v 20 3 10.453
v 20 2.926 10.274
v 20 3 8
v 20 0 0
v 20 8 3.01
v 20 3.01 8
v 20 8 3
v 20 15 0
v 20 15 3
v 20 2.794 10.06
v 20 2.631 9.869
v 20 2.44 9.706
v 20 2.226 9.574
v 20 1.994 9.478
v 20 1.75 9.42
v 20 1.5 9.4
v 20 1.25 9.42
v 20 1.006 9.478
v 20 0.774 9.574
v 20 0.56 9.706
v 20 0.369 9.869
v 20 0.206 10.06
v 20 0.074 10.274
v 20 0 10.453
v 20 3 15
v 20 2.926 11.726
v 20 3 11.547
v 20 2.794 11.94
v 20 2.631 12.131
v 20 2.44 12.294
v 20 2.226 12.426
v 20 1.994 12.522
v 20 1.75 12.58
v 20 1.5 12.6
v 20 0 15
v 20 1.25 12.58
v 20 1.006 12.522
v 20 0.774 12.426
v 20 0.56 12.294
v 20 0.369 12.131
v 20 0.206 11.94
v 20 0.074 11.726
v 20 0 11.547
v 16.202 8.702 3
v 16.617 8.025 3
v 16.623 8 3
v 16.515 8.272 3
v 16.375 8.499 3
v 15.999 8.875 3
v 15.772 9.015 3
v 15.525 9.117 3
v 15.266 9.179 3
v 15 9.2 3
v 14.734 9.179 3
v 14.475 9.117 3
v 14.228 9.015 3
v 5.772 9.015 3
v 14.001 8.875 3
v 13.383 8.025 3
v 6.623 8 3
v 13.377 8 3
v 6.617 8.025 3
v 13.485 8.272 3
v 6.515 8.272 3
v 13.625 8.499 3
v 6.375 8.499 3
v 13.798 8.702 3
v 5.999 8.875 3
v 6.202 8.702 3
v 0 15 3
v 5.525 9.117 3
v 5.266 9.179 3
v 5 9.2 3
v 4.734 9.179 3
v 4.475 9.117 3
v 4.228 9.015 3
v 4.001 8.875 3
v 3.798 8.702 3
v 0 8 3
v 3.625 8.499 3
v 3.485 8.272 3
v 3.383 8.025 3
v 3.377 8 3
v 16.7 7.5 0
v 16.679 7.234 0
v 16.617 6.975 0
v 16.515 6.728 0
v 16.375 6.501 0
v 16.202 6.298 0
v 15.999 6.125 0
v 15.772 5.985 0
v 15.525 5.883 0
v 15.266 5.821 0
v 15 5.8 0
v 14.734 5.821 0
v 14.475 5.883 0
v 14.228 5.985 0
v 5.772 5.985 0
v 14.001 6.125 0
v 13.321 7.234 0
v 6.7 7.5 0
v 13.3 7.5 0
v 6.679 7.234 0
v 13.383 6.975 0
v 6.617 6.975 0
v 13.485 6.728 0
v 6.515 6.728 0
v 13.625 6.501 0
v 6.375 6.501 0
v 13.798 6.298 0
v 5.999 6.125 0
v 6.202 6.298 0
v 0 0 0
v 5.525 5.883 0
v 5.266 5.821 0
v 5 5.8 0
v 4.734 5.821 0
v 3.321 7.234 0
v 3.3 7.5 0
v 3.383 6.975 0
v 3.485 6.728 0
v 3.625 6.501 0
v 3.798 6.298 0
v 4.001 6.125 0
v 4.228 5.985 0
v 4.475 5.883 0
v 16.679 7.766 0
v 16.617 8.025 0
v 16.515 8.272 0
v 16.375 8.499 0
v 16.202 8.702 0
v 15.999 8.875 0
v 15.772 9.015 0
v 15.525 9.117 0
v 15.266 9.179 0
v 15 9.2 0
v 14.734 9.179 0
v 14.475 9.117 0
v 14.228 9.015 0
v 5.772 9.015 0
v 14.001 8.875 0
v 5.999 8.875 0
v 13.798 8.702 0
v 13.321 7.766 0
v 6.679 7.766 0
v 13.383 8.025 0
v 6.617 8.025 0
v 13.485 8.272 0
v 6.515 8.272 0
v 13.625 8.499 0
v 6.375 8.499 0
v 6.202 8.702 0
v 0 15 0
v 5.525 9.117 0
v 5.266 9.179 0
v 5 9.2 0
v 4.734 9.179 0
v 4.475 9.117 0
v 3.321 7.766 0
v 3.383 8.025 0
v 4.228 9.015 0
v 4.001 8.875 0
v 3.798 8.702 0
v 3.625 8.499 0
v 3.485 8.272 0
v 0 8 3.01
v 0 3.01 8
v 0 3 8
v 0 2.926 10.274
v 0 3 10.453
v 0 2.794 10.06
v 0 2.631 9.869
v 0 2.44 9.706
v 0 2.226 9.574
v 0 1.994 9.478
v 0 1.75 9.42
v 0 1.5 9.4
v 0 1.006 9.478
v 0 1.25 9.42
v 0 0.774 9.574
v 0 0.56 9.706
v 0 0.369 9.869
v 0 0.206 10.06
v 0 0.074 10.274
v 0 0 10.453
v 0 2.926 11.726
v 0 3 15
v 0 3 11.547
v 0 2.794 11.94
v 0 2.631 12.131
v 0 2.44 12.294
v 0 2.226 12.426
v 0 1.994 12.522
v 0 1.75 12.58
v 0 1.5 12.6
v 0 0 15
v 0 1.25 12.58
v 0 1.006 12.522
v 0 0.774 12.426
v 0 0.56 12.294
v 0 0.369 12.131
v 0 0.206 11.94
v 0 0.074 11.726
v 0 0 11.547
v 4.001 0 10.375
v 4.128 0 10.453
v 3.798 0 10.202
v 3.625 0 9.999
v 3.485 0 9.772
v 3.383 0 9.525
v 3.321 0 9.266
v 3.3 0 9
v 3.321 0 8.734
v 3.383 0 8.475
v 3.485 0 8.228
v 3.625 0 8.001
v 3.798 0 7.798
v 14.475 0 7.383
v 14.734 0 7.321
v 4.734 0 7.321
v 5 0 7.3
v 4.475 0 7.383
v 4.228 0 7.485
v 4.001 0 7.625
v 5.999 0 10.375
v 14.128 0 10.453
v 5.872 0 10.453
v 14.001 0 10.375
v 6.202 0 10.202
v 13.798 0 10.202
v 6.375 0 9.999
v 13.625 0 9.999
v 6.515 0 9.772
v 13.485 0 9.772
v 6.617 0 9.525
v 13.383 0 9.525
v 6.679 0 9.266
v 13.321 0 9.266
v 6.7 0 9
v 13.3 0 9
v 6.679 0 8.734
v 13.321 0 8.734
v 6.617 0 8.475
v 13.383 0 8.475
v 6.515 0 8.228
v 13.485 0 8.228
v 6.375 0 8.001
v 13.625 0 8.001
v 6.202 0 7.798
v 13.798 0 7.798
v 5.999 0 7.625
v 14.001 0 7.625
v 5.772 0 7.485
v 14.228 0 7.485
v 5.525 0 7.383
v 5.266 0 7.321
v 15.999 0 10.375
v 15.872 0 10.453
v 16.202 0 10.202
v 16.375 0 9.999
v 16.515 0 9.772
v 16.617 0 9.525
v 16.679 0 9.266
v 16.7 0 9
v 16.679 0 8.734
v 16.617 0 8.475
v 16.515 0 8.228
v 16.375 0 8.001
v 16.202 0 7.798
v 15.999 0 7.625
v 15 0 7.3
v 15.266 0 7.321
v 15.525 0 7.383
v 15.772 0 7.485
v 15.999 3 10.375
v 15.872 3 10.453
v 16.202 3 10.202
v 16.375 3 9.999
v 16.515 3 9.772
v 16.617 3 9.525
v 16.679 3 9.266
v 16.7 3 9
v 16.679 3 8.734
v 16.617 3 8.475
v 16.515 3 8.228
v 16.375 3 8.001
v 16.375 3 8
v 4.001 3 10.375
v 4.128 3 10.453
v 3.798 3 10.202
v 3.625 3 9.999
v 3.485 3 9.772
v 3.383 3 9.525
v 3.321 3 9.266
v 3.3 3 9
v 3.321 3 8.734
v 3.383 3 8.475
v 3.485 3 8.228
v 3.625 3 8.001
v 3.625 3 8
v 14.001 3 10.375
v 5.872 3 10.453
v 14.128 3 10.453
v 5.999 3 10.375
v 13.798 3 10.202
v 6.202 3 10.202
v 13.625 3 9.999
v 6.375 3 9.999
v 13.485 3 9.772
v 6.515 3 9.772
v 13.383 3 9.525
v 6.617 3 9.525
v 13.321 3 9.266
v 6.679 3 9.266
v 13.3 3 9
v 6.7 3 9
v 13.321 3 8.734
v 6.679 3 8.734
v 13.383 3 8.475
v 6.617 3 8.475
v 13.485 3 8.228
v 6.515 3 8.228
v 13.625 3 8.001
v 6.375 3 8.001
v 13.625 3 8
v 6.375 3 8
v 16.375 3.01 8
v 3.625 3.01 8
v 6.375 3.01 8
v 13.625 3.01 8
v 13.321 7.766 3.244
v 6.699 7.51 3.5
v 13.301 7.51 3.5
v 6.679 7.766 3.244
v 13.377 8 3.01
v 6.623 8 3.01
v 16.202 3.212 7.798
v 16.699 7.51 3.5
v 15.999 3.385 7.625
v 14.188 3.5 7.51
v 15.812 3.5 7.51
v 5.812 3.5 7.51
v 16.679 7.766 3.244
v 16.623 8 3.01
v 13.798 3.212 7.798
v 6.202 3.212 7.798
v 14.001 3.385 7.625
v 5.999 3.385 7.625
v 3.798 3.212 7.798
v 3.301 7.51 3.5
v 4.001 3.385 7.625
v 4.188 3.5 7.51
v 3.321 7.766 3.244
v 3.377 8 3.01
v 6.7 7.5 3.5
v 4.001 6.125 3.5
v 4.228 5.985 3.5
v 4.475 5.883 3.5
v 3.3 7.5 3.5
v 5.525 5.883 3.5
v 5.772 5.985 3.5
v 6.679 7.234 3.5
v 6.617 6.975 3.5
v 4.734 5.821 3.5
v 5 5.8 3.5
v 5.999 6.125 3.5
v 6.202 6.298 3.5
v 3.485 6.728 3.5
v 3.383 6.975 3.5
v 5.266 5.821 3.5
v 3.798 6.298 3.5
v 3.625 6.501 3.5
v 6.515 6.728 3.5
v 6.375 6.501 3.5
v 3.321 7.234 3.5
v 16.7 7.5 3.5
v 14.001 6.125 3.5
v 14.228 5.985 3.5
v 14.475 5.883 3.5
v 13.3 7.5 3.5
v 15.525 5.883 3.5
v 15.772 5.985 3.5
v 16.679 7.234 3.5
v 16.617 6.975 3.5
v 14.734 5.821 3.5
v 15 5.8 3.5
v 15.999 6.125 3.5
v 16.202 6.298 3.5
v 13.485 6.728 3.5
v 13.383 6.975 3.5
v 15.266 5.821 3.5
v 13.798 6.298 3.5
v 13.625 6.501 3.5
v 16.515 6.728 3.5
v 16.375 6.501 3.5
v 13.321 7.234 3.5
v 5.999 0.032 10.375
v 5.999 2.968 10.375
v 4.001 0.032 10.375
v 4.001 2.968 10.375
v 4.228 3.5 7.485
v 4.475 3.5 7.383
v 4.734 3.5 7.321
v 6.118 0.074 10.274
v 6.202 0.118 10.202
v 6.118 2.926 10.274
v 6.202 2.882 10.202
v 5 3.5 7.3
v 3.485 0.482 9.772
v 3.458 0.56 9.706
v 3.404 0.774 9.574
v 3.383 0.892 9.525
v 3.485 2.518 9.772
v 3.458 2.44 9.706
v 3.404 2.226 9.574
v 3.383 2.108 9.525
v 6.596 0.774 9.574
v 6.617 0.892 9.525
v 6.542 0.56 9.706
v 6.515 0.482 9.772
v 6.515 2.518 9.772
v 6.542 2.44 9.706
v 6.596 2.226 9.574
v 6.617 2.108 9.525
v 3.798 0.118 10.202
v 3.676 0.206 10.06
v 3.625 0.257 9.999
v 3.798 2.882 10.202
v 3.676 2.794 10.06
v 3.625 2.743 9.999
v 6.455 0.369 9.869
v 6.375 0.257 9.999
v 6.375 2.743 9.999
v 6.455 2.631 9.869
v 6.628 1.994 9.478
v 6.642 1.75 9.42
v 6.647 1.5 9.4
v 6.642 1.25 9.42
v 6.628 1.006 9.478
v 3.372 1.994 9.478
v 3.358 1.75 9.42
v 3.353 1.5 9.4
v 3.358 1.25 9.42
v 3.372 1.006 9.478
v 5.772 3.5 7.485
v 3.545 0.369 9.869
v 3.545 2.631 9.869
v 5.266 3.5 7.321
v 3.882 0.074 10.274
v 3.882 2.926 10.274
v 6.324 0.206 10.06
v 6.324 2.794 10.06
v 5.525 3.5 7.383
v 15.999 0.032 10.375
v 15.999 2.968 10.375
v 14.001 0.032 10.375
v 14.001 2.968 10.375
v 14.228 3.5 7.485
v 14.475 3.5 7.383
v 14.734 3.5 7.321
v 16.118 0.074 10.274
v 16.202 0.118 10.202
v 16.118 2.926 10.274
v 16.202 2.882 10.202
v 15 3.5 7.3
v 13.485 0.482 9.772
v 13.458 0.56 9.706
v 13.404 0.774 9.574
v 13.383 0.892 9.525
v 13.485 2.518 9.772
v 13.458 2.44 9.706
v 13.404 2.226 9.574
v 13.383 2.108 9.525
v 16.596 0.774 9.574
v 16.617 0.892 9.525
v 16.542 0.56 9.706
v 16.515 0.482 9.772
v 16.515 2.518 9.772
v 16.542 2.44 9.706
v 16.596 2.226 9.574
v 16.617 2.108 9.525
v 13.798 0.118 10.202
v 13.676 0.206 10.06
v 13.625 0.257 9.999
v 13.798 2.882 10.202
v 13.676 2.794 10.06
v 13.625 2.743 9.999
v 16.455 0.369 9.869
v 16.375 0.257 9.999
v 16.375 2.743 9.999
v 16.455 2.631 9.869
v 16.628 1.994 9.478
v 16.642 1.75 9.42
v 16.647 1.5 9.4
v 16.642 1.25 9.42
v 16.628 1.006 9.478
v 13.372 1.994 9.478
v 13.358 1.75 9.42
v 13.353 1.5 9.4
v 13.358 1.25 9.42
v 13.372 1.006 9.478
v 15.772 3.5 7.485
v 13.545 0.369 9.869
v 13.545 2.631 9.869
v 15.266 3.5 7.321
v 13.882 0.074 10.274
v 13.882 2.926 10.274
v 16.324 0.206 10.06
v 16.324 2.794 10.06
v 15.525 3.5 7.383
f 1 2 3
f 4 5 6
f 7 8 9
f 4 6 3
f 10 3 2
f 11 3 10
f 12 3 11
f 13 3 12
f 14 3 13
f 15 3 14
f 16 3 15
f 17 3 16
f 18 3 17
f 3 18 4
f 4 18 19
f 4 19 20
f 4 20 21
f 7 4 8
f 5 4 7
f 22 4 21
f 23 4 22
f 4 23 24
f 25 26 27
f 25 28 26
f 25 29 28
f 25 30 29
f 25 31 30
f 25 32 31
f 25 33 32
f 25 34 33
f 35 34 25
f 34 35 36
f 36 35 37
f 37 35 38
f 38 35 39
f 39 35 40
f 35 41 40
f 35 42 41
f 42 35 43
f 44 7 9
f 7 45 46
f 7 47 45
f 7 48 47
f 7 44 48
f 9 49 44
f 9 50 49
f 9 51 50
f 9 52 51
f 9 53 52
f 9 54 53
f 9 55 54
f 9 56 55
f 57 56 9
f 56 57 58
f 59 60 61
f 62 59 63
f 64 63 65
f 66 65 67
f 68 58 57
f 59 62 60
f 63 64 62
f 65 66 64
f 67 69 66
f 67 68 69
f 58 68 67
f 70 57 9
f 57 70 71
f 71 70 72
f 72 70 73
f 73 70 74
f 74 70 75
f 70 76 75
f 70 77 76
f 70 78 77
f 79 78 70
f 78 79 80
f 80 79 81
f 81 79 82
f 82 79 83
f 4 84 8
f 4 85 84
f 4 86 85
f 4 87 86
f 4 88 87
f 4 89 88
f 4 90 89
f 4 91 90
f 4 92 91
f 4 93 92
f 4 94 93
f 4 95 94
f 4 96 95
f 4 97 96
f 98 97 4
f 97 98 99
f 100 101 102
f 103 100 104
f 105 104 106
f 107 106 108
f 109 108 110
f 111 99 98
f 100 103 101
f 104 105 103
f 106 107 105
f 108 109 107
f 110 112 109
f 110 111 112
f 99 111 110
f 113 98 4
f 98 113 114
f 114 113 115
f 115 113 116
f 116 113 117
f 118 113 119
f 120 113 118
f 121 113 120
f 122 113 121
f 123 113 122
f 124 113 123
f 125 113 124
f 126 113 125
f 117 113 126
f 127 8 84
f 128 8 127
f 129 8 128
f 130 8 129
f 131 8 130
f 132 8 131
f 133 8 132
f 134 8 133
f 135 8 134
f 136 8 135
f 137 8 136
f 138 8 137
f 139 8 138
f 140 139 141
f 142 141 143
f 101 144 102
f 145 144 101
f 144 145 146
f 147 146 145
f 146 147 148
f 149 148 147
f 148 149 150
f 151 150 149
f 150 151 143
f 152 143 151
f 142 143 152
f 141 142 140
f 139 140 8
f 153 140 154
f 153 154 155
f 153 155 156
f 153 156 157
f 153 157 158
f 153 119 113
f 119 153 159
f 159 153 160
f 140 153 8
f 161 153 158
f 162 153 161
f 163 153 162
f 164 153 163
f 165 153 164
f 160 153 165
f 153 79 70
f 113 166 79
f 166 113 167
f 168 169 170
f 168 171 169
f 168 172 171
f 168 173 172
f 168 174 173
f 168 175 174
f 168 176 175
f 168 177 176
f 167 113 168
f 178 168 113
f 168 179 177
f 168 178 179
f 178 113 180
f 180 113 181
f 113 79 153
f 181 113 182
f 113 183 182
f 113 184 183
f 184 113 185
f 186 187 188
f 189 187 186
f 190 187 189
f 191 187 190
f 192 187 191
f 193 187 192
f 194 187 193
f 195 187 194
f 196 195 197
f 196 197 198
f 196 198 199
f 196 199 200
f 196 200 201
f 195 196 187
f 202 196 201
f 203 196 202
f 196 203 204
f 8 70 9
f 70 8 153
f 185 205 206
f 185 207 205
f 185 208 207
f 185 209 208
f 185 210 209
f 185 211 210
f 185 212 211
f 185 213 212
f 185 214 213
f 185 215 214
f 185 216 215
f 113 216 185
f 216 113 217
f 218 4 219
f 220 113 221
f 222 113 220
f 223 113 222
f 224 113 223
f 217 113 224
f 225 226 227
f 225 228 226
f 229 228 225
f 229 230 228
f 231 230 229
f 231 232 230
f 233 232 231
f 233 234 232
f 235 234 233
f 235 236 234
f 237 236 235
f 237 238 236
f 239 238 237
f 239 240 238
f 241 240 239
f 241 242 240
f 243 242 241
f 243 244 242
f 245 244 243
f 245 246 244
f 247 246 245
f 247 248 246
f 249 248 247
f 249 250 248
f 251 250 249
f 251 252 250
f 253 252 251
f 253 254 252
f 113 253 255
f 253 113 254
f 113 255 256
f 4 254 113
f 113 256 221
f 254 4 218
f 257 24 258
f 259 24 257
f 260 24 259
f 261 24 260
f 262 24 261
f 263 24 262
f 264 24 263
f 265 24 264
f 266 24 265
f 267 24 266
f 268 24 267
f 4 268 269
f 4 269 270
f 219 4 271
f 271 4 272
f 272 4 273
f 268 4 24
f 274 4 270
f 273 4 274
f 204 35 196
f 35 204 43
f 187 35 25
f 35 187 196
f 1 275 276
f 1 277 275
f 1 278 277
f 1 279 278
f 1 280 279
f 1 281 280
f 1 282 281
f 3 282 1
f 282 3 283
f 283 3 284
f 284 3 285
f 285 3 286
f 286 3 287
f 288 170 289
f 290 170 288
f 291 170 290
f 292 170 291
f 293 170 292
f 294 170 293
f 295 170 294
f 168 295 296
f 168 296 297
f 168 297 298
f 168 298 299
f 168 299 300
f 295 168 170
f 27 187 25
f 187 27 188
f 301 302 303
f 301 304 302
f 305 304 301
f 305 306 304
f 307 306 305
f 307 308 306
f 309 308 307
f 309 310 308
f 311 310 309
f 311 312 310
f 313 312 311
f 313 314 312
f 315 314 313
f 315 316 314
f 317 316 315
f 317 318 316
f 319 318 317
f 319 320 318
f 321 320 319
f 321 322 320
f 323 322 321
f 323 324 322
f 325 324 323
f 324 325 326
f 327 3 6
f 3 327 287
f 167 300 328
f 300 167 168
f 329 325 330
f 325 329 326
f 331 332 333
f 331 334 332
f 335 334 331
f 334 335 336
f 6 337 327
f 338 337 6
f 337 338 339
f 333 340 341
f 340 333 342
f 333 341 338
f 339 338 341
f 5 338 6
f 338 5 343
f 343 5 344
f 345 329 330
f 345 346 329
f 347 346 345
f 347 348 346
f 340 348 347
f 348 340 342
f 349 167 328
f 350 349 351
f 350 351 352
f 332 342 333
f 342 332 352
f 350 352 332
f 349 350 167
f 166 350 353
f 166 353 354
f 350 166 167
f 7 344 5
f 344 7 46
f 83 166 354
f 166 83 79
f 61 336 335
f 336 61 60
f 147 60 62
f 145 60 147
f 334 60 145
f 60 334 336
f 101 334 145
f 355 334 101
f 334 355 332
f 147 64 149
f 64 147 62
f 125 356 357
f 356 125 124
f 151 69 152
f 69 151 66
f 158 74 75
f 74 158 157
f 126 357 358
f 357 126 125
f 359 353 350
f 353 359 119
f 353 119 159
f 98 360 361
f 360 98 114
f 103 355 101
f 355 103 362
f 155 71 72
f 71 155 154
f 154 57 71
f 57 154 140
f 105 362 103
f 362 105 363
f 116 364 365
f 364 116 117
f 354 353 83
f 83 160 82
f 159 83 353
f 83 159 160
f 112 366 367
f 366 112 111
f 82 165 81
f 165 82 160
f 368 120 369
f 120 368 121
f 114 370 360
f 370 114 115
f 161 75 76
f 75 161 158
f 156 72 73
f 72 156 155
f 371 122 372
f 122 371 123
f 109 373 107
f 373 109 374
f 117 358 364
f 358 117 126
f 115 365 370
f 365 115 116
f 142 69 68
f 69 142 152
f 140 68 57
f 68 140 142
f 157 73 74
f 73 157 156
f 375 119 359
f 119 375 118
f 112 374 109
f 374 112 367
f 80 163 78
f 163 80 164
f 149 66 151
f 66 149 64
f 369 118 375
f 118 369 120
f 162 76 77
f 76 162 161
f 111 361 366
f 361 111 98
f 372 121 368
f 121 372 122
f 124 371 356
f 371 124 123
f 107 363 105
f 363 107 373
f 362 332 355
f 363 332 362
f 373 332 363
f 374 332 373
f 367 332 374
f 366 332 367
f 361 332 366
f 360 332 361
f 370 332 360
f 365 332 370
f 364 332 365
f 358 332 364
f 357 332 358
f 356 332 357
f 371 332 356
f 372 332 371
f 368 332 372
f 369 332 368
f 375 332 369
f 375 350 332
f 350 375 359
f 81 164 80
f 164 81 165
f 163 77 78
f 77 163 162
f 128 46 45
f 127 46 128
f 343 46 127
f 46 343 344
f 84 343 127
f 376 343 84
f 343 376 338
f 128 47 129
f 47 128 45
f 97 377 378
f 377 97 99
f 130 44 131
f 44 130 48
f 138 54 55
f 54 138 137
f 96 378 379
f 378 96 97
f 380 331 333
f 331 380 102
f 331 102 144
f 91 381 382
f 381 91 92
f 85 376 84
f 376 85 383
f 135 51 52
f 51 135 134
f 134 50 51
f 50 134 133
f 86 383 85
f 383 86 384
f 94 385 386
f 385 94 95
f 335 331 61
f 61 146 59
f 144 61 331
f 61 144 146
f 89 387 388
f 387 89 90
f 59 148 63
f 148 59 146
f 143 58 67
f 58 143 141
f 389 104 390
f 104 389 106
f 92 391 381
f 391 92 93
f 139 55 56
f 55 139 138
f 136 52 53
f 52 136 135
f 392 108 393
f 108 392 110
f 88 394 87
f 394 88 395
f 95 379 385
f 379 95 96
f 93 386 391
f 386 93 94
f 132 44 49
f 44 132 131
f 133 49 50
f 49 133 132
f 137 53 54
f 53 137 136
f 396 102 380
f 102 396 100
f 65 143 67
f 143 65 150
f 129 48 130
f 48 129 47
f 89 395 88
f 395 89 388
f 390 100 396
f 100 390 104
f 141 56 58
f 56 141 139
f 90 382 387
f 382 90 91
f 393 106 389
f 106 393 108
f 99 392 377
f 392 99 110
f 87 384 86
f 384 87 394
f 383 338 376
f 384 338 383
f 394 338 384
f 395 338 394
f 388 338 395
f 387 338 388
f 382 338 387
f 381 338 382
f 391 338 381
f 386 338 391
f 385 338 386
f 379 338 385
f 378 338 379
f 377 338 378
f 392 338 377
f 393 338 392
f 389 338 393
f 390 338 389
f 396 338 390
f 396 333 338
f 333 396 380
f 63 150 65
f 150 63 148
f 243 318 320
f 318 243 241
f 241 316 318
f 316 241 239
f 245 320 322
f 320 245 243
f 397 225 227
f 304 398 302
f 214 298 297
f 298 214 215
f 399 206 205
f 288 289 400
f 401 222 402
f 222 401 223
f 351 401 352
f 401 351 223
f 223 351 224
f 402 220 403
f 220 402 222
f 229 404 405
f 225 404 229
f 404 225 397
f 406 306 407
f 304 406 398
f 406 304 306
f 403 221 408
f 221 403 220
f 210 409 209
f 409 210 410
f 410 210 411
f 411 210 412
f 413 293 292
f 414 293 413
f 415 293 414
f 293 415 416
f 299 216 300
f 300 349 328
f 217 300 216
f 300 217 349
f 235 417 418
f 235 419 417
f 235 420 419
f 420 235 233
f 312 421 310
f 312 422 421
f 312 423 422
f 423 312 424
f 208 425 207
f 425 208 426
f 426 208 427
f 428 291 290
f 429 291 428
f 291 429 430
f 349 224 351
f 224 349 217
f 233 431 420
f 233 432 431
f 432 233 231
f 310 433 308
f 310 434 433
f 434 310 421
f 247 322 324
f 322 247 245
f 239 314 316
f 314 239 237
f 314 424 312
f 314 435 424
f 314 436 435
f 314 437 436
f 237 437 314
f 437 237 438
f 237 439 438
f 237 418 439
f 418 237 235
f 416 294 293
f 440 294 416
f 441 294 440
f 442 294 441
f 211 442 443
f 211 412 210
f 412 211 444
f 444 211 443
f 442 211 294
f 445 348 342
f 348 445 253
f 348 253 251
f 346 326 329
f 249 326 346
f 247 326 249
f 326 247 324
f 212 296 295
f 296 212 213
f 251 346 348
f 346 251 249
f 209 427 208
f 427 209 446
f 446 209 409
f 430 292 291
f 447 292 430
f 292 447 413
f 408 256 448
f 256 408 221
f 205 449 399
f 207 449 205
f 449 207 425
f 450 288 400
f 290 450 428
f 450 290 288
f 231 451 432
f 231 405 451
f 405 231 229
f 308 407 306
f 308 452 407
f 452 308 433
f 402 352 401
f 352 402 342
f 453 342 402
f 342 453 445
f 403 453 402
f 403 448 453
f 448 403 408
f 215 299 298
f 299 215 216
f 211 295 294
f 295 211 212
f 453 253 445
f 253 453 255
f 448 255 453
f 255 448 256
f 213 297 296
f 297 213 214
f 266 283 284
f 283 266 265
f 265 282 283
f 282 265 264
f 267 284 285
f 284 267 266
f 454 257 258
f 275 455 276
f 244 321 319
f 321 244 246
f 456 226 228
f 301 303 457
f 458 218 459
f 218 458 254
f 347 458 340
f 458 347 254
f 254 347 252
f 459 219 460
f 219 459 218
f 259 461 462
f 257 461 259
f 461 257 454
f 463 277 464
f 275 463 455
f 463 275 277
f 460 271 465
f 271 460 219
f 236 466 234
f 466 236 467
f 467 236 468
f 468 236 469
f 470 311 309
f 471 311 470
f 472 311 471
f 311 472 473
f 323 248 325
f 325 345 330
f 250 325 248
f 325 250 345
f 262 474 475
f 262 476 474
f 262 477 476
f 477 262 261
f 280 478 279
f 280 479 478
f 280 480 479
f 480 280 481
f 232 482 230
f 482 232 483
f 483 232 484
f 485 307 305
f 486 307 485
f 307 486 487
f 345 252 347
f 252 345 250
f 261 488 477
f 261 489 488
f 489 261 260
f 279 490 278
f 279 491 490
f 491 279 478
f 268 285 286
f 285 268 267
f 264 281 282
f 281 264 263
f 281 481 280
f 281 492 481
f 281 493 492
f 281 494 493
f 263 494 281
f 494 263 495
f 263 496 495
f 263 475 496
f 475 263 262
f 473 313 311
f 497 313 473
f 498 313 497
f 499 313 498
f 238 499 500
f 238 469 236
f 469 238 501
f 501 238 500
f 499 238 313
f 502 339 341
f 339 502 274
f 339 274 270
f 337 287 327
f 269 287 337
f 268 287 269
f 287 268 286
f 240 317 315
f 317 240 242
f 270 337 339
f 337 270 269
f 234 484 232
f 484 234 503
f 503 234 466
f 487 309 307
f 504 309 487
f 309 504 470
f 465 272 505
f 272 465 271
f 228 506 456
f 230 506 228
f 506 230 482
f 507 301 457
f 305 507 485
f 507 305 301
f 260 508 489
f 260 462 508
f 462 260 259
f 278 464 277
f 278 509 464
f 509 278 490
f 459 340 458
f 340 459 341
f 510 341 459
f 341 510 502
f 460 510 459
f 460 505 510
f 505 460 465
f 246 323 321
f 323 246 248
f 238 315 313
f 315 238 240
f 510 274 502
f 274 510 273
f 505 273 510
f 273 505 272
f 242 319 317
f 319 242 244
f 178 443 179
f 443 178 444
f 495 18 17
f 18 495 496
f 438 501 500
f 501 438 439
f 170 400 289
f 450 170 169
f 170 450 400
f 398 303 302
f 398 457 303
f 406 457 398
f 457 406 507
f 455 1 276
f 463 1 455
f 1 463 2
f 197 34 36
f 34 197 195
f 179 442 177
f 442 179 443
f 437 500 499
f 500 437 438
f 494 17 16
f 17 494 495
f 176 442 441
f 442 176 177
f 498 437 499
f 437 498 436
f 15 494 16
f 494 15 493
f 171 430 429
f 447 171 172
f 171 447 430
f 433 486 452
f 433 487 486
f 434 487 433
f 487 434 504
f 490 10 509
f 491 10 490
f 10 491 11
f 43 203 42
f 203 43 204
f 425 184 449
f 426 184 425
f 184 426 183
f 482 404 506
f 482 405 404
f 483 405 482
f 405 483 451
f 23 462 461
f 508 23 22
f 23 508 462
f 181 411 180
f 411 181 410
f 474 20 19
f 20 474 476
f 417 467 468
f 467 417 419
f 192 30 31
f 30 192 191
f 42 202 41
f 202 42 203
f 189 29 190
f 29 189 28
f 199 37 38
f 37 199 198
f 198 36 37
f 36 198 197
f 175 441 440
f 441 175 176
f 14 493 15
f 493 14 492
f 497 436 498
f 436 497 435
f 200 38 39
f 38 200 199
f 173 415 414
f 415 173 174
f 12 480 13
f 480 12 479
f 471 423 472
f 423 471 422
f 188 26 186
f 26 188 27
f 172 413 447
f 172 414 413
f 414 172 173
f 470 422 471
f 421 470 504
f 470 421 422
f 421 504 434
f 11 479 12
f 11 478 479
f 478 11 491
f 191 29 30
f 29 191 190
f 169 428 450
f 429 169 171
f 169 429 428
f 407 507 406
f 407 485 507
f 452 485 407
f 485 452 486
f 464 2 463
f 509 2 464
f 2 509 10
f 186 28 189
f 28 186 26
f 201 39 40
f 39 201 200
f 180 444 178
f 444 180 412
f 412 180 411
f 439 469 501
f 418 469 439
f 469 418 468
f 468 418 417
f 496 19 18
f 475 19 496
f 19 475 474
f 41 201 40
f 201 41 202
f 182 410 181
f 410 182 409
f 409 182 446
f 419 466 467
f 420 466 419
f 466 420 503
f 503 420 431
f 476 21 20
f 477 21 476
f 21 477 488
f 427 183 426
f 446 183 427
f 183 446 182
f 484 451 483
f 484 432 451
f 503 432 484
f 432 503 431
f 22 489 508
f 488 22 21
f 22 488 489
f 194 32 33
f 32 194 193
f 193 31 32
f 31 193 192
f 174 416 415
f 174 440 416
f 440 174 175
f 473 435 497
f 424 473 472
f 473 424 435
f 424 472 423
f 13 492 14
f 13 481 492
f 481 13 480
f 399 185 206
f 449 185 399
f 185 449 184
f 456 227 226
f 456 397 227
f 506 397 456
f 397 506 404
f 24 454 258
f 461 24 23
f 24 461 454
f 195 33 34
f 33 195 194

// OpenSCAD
// FoldIt Robot - L-Shaped Hinge Bracket
// Connects folding panels to the base plate via hinge pins
// Dimensions: 20mm x 15mm x 15mm, 3mm wall thickness
// Two M3 holes on each arm, 3mm hinge pin hole

$fn = 40;

// Bracket parameters
bracket_width = 20;      // width (along hinge axis)
bracket_arm_h = 15;      // height of vertical arm
bracket_arm_l = 15;      // length of horizontal arm
wall = 3;                // wall thickness

// Hole parameters
m3_hole = 3.4;           // M3 clearance
pin_hole = 3.2;          // hinge pin diameter (3mm pin + clearance)
hole_inset = 5;          // inset from edges for mounting holes

module hinge_bracket() {
    difference() {
        // L-shaped body
        union() {
            // Horizontal arm (mounts to base plate)
            cube([bracket_width, bracket_arm_l, wall]);

            // Vertical arm (mounts to panel and holds hinge pin)
            cube([bracket_width, wall, bracket_arm_h]);

            // Fillet/reinforcement at the L junction
            translate([0, 0, 0])
                _corner_fillet();
        }

        // Horizontal arm mounting holes (2 holes for M3 screws into base)
        for (x = [hole_inset, bracket_width - hole_inset]) {
            translate([x, bracket_arm_l / 2, -0.5])
                cylinder(d=m3_hole, h=wall + 1);
        }

        // Vertical arm mounting holes (2 holes for M3 screws into panel)
        for (x = [hole_inset, bracket_width - hole_inset]) {
            translate([x, -0.5, bracket_arm_h * 0.6])
                rotate([-90, 0, 0])
                    cylinder(d=m3_hole, h=wall + 1);
        }

        // Hinge pin hole through the top of the vertical arm
        translate([-0.5, wall / 2, bracket_arm_h - 4])
            rotate([0, 90, 0])
                cylinder(d=pin_hole, h=bracket_width + 1);
    }
}

module _corner_fillet() {
    // Triangular reinforcement wedge at the L-joint
    fillet_size = 5;

    // Wedge connecting horizontal and vertical arms
    translate([0, wall, wall])
        hull() {
            // Thin strip along vertical arm
            cube([bracket_width, 0.01, fillet_size]);
            // Thin strip along horizontal arm
            cube([bracket_width, fillet_size, 0.01]);
        }
}

// Render when opened directly
hinge_bracket();
